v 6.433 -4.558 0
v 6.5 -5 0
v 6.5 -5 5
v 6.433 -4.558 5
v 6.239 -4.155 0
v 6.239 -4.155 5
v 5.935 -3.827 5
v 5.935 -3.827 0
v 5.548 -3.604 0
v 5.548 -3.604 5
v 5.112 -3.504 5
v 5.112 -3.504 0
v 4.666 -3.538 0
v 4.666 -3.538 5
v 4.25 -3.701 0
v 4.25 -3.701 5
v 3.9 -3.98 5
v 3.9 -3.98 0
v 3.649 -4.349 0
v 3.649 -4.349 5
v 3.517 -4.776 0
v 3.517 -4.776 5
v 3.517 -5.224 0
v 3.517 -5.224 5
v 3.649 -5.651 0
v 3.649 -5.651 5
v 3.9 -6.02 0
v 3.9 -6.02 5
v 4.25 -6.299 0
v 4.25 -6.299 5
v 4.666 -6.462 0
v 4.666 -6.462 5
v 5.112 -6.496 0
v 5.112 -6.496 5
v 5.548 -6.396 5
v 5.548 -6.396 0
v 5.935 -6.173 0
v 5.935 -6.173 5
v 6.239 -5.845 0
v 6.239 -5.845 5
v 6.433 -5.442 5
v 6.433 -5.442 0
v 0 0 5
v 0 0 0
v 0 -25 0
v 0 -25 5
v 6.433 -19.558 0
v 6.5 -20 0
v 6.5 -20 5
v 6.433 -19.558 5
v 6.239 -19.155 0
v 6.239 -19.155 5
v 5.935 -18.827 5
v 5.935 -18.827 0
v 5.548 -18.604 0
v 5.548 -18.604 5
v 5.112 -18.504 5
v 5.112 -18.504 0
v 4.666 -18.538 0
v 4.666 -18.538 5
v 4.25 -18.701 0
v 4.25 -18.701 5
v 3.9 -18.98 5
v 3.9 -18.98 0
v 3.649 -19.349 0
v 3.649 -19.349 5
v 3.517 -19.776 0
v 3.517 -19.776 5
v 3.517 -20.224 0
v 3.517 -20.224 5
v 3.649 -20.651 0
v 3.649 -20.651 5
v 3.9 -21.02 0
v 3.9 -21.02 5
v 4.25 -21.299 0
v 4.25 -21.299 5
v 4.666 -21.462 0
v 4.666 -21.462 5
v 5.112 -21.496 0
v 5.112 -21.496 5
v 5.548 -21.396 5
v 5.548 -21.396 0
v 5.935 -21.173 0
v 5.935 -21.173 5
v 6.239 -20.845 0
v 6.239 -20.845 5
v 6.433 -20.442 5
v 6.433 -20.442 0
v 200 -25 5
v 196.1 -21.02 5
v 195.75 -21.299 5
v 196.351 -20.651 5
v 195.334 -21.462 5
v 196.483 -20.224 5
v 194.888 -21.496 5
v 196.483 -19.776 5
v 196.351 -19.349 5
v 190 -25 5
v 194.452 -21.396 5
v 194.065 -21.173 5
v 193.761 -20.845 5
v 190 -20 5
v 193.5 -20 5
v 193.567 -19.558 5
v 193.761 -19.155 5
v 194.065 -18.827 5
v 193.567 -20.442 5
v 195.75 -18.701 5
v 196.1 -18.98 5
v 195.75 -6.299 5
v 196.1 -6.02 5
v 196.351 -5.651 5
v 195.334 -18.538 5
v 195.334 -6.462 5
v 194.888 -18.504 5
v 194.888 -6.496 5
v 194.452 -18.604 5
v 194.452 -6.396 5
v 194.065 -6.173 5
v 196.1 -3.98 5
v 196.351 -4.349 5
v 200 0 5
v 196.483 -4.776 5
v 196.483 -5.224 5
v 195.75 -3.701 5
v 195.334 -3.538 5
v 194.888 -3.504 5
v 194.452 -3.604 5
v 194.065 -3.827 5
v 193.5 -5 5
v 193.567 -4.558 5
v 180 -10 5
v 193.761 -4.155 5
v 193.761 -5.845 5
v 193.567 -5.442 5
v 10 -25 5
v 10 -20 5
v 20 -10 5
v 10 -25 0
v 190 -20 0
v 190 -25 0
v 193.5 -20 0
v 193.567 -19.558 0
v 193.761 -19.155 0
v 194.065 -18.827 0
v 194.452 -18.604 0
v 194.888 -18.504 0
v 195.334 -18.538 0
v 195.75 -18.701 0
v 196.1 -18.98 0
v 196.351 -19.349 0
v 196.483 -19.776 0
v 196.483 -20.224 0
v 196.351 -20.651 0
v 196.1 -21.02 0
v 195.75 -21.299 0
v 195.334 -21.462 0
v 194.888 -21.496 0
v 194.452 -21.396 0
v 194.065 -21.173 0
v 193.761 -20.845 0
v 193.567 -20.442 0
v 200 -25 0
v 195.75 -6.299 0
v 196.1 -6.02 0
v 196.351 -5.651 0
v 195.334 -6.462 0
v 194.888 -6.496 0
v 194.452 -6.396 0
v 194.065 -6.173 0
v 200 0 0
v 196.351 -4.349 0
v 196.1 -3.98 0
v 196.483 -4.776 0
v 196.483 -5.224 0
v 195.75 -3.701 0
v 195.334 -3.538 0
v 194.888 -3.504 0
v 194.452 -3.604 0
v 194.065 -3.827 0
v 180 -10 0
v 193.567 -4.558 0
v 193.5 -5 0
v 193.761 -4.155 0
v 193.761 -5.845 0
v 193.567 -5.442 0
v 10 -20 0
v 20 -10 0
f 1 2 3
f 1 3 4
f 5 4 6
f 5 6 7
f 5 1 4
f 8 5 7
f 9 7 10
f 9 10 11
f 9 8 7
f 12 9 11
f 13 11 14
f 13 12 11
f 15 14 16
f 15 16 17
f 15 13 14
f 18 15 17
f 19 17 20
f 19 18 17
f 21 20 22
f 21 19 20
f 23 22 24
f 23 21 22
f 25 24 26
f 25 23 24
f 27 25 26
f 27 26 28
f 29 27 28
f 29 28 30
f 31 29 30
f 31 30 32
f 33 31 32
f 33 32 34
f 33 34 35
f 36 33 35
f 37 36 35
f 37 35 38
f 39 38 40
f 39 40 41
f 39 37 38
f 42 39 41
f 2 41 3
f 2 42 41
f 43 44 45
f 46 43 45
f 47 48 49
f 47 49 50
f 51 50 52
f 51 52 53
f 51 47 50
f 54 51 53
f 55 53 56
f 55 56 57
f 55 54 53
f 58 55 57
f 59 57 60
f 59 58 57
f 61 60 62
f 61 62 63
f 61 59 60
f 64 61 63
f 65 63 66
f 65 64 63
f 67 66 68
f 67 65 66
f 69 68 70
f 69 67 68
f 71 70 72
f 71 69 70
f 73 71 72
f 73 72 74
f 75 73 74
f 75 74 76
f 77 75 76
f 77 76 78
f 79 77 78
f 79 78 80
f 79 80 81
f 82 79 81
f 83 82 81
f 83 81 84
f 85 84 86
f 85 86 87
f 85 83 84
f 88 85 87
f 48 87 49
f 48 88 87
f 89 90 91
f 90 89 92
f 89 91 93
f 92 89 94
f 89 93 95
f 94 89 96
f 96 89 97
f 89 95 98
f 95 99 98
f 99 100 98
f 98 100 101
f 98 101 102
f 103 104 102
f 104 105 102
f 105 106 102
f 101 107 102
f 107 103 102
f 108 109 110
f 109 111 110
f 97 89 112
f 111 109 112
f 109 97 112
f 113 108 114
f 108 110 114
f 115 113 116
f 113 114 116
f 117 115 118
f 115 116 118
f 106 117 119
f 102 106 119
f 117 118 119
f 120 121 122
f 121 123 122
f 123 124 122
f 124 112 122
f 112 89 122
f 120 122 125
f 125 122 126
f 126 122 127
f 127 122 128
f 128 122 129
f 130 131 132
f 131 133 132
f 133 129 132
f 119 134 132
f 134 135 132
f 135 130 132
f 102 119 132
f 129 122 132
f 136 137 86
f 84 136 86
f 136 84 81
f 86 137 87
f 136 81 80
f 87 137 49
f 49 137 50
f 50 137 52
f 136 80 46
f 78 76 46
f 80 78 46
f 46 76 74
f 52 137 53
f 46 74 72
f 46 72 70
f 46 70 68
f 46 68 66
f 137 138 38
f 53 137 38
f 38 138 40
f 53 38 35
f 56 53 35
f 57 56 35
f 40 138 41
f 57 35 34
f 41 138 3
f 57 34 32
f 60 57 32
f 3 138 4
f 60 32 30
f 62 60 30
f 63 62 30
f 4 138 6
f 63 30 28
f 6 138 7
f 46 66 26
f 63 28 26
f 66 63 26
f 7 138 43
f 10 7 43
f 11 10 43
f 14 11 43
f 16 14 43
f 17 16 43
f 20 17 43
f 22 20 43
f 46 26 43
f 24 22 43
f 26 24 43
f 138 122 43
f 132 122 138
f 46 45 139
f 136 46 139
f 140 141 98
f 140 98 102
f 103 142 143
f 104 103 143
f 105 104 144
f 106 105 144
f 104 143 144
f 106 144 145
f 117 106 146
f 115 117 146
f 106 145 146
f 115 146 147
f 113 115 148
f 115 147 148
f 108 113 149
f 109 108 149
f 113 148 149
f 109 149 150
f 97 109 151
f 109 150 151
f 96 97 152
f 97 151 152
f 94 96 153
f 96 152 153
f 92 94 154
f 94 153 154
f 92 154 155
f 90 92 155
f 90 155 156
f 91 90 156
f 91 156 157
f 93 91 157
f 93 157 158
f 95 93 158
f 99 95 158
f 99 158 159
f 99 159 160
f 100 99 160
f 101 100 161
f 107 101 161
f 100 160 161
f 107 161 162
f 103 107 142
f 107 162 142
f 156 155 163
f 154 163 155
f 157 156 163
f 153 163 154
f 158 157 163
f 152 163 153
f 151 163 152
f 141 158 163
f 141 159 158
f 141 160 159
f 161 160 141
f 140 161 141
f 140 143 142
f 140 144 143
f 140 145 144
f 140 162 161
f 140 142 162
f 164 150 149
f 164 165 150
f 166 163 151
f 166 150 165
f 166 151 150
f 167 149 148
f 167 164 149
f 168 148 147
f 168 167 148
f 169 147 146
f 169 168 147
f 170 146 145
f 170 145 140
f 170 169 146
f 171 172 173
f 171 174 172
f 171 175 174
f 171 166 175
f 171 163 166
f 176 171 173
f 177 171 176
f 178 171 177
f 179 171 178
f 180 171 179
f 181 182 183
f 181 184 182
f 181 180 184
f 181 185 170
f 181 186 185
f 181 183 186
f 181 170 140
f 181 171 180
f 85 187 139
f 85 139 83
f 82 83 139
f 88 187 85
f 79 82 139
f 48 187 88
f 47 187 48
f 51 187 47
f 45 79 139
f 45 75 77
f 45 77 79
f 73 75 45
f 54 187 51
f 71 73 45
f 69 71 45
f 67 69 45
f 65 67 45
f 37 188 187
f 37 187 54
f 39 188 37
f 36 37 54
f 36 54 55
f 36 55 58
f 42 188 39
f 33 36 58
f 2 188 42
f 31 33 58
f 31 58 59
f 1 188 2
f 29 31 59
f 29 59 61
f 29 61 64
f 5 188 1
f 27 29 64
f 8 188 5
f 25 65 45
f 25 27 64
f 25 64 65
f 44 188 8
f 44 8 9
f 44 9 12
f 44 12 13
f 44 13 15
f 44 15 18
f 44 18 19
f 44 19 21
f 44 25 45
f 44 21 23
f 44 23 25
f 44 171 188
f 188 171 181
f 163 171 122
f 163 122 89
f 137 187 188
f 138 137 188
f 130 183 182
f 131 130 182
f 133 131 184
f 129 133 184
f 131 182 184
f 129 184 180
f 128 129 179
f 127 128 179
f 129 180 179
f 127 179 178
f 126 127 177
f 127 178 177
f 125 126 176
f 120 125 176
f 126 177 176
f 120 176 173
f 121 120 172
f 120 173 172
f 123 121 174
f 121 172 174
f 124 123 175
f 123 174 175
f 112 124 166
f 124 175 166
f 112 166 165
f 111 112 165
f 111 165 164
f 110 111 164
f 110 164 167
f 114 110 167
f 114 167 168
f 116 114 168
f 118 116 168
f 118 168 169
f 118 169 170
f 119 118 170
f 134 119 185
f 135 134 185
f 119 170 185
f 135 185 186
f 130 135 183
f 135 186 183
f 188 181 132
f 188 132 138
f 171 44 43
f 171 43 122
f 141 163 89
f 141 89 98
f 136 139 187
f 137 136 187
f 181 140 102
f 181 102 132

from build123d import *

# Parameters (mm, degrees)
SKETCH1_R           = 1.5
BOSS_EXTRUDE1_DEPTH = 5


with BuildPart() as part:
    # Sketch1 → Boss-Extrude1 (new body)
    with BuildSketch(Plane.XY):
        Polygon((0, 0), (0, -25), (10, -25), (10, -20), (20, -10), (100, -10), (100, 0), align=None)
        with Locations((5, -20)):
            Circle(SKETCH1_R, mode=Mode.SUBTRACT)
        with Locations((5, -5)):
            Circle(SKETCH1_R, mode=Mode.SUBTRACT)
    extrude(amount=BOSS_EXTRUDE1_DEPTH)

    # Mirror1: part across plane


with BuildPart() as part_1:
    add(part.part)
    add(part.part.mirror(Plane(origin=(100, -10, 5), x_dir=(0, 0, 1), z_dir=(-1, 0, 0))))


solid = part_1.part
